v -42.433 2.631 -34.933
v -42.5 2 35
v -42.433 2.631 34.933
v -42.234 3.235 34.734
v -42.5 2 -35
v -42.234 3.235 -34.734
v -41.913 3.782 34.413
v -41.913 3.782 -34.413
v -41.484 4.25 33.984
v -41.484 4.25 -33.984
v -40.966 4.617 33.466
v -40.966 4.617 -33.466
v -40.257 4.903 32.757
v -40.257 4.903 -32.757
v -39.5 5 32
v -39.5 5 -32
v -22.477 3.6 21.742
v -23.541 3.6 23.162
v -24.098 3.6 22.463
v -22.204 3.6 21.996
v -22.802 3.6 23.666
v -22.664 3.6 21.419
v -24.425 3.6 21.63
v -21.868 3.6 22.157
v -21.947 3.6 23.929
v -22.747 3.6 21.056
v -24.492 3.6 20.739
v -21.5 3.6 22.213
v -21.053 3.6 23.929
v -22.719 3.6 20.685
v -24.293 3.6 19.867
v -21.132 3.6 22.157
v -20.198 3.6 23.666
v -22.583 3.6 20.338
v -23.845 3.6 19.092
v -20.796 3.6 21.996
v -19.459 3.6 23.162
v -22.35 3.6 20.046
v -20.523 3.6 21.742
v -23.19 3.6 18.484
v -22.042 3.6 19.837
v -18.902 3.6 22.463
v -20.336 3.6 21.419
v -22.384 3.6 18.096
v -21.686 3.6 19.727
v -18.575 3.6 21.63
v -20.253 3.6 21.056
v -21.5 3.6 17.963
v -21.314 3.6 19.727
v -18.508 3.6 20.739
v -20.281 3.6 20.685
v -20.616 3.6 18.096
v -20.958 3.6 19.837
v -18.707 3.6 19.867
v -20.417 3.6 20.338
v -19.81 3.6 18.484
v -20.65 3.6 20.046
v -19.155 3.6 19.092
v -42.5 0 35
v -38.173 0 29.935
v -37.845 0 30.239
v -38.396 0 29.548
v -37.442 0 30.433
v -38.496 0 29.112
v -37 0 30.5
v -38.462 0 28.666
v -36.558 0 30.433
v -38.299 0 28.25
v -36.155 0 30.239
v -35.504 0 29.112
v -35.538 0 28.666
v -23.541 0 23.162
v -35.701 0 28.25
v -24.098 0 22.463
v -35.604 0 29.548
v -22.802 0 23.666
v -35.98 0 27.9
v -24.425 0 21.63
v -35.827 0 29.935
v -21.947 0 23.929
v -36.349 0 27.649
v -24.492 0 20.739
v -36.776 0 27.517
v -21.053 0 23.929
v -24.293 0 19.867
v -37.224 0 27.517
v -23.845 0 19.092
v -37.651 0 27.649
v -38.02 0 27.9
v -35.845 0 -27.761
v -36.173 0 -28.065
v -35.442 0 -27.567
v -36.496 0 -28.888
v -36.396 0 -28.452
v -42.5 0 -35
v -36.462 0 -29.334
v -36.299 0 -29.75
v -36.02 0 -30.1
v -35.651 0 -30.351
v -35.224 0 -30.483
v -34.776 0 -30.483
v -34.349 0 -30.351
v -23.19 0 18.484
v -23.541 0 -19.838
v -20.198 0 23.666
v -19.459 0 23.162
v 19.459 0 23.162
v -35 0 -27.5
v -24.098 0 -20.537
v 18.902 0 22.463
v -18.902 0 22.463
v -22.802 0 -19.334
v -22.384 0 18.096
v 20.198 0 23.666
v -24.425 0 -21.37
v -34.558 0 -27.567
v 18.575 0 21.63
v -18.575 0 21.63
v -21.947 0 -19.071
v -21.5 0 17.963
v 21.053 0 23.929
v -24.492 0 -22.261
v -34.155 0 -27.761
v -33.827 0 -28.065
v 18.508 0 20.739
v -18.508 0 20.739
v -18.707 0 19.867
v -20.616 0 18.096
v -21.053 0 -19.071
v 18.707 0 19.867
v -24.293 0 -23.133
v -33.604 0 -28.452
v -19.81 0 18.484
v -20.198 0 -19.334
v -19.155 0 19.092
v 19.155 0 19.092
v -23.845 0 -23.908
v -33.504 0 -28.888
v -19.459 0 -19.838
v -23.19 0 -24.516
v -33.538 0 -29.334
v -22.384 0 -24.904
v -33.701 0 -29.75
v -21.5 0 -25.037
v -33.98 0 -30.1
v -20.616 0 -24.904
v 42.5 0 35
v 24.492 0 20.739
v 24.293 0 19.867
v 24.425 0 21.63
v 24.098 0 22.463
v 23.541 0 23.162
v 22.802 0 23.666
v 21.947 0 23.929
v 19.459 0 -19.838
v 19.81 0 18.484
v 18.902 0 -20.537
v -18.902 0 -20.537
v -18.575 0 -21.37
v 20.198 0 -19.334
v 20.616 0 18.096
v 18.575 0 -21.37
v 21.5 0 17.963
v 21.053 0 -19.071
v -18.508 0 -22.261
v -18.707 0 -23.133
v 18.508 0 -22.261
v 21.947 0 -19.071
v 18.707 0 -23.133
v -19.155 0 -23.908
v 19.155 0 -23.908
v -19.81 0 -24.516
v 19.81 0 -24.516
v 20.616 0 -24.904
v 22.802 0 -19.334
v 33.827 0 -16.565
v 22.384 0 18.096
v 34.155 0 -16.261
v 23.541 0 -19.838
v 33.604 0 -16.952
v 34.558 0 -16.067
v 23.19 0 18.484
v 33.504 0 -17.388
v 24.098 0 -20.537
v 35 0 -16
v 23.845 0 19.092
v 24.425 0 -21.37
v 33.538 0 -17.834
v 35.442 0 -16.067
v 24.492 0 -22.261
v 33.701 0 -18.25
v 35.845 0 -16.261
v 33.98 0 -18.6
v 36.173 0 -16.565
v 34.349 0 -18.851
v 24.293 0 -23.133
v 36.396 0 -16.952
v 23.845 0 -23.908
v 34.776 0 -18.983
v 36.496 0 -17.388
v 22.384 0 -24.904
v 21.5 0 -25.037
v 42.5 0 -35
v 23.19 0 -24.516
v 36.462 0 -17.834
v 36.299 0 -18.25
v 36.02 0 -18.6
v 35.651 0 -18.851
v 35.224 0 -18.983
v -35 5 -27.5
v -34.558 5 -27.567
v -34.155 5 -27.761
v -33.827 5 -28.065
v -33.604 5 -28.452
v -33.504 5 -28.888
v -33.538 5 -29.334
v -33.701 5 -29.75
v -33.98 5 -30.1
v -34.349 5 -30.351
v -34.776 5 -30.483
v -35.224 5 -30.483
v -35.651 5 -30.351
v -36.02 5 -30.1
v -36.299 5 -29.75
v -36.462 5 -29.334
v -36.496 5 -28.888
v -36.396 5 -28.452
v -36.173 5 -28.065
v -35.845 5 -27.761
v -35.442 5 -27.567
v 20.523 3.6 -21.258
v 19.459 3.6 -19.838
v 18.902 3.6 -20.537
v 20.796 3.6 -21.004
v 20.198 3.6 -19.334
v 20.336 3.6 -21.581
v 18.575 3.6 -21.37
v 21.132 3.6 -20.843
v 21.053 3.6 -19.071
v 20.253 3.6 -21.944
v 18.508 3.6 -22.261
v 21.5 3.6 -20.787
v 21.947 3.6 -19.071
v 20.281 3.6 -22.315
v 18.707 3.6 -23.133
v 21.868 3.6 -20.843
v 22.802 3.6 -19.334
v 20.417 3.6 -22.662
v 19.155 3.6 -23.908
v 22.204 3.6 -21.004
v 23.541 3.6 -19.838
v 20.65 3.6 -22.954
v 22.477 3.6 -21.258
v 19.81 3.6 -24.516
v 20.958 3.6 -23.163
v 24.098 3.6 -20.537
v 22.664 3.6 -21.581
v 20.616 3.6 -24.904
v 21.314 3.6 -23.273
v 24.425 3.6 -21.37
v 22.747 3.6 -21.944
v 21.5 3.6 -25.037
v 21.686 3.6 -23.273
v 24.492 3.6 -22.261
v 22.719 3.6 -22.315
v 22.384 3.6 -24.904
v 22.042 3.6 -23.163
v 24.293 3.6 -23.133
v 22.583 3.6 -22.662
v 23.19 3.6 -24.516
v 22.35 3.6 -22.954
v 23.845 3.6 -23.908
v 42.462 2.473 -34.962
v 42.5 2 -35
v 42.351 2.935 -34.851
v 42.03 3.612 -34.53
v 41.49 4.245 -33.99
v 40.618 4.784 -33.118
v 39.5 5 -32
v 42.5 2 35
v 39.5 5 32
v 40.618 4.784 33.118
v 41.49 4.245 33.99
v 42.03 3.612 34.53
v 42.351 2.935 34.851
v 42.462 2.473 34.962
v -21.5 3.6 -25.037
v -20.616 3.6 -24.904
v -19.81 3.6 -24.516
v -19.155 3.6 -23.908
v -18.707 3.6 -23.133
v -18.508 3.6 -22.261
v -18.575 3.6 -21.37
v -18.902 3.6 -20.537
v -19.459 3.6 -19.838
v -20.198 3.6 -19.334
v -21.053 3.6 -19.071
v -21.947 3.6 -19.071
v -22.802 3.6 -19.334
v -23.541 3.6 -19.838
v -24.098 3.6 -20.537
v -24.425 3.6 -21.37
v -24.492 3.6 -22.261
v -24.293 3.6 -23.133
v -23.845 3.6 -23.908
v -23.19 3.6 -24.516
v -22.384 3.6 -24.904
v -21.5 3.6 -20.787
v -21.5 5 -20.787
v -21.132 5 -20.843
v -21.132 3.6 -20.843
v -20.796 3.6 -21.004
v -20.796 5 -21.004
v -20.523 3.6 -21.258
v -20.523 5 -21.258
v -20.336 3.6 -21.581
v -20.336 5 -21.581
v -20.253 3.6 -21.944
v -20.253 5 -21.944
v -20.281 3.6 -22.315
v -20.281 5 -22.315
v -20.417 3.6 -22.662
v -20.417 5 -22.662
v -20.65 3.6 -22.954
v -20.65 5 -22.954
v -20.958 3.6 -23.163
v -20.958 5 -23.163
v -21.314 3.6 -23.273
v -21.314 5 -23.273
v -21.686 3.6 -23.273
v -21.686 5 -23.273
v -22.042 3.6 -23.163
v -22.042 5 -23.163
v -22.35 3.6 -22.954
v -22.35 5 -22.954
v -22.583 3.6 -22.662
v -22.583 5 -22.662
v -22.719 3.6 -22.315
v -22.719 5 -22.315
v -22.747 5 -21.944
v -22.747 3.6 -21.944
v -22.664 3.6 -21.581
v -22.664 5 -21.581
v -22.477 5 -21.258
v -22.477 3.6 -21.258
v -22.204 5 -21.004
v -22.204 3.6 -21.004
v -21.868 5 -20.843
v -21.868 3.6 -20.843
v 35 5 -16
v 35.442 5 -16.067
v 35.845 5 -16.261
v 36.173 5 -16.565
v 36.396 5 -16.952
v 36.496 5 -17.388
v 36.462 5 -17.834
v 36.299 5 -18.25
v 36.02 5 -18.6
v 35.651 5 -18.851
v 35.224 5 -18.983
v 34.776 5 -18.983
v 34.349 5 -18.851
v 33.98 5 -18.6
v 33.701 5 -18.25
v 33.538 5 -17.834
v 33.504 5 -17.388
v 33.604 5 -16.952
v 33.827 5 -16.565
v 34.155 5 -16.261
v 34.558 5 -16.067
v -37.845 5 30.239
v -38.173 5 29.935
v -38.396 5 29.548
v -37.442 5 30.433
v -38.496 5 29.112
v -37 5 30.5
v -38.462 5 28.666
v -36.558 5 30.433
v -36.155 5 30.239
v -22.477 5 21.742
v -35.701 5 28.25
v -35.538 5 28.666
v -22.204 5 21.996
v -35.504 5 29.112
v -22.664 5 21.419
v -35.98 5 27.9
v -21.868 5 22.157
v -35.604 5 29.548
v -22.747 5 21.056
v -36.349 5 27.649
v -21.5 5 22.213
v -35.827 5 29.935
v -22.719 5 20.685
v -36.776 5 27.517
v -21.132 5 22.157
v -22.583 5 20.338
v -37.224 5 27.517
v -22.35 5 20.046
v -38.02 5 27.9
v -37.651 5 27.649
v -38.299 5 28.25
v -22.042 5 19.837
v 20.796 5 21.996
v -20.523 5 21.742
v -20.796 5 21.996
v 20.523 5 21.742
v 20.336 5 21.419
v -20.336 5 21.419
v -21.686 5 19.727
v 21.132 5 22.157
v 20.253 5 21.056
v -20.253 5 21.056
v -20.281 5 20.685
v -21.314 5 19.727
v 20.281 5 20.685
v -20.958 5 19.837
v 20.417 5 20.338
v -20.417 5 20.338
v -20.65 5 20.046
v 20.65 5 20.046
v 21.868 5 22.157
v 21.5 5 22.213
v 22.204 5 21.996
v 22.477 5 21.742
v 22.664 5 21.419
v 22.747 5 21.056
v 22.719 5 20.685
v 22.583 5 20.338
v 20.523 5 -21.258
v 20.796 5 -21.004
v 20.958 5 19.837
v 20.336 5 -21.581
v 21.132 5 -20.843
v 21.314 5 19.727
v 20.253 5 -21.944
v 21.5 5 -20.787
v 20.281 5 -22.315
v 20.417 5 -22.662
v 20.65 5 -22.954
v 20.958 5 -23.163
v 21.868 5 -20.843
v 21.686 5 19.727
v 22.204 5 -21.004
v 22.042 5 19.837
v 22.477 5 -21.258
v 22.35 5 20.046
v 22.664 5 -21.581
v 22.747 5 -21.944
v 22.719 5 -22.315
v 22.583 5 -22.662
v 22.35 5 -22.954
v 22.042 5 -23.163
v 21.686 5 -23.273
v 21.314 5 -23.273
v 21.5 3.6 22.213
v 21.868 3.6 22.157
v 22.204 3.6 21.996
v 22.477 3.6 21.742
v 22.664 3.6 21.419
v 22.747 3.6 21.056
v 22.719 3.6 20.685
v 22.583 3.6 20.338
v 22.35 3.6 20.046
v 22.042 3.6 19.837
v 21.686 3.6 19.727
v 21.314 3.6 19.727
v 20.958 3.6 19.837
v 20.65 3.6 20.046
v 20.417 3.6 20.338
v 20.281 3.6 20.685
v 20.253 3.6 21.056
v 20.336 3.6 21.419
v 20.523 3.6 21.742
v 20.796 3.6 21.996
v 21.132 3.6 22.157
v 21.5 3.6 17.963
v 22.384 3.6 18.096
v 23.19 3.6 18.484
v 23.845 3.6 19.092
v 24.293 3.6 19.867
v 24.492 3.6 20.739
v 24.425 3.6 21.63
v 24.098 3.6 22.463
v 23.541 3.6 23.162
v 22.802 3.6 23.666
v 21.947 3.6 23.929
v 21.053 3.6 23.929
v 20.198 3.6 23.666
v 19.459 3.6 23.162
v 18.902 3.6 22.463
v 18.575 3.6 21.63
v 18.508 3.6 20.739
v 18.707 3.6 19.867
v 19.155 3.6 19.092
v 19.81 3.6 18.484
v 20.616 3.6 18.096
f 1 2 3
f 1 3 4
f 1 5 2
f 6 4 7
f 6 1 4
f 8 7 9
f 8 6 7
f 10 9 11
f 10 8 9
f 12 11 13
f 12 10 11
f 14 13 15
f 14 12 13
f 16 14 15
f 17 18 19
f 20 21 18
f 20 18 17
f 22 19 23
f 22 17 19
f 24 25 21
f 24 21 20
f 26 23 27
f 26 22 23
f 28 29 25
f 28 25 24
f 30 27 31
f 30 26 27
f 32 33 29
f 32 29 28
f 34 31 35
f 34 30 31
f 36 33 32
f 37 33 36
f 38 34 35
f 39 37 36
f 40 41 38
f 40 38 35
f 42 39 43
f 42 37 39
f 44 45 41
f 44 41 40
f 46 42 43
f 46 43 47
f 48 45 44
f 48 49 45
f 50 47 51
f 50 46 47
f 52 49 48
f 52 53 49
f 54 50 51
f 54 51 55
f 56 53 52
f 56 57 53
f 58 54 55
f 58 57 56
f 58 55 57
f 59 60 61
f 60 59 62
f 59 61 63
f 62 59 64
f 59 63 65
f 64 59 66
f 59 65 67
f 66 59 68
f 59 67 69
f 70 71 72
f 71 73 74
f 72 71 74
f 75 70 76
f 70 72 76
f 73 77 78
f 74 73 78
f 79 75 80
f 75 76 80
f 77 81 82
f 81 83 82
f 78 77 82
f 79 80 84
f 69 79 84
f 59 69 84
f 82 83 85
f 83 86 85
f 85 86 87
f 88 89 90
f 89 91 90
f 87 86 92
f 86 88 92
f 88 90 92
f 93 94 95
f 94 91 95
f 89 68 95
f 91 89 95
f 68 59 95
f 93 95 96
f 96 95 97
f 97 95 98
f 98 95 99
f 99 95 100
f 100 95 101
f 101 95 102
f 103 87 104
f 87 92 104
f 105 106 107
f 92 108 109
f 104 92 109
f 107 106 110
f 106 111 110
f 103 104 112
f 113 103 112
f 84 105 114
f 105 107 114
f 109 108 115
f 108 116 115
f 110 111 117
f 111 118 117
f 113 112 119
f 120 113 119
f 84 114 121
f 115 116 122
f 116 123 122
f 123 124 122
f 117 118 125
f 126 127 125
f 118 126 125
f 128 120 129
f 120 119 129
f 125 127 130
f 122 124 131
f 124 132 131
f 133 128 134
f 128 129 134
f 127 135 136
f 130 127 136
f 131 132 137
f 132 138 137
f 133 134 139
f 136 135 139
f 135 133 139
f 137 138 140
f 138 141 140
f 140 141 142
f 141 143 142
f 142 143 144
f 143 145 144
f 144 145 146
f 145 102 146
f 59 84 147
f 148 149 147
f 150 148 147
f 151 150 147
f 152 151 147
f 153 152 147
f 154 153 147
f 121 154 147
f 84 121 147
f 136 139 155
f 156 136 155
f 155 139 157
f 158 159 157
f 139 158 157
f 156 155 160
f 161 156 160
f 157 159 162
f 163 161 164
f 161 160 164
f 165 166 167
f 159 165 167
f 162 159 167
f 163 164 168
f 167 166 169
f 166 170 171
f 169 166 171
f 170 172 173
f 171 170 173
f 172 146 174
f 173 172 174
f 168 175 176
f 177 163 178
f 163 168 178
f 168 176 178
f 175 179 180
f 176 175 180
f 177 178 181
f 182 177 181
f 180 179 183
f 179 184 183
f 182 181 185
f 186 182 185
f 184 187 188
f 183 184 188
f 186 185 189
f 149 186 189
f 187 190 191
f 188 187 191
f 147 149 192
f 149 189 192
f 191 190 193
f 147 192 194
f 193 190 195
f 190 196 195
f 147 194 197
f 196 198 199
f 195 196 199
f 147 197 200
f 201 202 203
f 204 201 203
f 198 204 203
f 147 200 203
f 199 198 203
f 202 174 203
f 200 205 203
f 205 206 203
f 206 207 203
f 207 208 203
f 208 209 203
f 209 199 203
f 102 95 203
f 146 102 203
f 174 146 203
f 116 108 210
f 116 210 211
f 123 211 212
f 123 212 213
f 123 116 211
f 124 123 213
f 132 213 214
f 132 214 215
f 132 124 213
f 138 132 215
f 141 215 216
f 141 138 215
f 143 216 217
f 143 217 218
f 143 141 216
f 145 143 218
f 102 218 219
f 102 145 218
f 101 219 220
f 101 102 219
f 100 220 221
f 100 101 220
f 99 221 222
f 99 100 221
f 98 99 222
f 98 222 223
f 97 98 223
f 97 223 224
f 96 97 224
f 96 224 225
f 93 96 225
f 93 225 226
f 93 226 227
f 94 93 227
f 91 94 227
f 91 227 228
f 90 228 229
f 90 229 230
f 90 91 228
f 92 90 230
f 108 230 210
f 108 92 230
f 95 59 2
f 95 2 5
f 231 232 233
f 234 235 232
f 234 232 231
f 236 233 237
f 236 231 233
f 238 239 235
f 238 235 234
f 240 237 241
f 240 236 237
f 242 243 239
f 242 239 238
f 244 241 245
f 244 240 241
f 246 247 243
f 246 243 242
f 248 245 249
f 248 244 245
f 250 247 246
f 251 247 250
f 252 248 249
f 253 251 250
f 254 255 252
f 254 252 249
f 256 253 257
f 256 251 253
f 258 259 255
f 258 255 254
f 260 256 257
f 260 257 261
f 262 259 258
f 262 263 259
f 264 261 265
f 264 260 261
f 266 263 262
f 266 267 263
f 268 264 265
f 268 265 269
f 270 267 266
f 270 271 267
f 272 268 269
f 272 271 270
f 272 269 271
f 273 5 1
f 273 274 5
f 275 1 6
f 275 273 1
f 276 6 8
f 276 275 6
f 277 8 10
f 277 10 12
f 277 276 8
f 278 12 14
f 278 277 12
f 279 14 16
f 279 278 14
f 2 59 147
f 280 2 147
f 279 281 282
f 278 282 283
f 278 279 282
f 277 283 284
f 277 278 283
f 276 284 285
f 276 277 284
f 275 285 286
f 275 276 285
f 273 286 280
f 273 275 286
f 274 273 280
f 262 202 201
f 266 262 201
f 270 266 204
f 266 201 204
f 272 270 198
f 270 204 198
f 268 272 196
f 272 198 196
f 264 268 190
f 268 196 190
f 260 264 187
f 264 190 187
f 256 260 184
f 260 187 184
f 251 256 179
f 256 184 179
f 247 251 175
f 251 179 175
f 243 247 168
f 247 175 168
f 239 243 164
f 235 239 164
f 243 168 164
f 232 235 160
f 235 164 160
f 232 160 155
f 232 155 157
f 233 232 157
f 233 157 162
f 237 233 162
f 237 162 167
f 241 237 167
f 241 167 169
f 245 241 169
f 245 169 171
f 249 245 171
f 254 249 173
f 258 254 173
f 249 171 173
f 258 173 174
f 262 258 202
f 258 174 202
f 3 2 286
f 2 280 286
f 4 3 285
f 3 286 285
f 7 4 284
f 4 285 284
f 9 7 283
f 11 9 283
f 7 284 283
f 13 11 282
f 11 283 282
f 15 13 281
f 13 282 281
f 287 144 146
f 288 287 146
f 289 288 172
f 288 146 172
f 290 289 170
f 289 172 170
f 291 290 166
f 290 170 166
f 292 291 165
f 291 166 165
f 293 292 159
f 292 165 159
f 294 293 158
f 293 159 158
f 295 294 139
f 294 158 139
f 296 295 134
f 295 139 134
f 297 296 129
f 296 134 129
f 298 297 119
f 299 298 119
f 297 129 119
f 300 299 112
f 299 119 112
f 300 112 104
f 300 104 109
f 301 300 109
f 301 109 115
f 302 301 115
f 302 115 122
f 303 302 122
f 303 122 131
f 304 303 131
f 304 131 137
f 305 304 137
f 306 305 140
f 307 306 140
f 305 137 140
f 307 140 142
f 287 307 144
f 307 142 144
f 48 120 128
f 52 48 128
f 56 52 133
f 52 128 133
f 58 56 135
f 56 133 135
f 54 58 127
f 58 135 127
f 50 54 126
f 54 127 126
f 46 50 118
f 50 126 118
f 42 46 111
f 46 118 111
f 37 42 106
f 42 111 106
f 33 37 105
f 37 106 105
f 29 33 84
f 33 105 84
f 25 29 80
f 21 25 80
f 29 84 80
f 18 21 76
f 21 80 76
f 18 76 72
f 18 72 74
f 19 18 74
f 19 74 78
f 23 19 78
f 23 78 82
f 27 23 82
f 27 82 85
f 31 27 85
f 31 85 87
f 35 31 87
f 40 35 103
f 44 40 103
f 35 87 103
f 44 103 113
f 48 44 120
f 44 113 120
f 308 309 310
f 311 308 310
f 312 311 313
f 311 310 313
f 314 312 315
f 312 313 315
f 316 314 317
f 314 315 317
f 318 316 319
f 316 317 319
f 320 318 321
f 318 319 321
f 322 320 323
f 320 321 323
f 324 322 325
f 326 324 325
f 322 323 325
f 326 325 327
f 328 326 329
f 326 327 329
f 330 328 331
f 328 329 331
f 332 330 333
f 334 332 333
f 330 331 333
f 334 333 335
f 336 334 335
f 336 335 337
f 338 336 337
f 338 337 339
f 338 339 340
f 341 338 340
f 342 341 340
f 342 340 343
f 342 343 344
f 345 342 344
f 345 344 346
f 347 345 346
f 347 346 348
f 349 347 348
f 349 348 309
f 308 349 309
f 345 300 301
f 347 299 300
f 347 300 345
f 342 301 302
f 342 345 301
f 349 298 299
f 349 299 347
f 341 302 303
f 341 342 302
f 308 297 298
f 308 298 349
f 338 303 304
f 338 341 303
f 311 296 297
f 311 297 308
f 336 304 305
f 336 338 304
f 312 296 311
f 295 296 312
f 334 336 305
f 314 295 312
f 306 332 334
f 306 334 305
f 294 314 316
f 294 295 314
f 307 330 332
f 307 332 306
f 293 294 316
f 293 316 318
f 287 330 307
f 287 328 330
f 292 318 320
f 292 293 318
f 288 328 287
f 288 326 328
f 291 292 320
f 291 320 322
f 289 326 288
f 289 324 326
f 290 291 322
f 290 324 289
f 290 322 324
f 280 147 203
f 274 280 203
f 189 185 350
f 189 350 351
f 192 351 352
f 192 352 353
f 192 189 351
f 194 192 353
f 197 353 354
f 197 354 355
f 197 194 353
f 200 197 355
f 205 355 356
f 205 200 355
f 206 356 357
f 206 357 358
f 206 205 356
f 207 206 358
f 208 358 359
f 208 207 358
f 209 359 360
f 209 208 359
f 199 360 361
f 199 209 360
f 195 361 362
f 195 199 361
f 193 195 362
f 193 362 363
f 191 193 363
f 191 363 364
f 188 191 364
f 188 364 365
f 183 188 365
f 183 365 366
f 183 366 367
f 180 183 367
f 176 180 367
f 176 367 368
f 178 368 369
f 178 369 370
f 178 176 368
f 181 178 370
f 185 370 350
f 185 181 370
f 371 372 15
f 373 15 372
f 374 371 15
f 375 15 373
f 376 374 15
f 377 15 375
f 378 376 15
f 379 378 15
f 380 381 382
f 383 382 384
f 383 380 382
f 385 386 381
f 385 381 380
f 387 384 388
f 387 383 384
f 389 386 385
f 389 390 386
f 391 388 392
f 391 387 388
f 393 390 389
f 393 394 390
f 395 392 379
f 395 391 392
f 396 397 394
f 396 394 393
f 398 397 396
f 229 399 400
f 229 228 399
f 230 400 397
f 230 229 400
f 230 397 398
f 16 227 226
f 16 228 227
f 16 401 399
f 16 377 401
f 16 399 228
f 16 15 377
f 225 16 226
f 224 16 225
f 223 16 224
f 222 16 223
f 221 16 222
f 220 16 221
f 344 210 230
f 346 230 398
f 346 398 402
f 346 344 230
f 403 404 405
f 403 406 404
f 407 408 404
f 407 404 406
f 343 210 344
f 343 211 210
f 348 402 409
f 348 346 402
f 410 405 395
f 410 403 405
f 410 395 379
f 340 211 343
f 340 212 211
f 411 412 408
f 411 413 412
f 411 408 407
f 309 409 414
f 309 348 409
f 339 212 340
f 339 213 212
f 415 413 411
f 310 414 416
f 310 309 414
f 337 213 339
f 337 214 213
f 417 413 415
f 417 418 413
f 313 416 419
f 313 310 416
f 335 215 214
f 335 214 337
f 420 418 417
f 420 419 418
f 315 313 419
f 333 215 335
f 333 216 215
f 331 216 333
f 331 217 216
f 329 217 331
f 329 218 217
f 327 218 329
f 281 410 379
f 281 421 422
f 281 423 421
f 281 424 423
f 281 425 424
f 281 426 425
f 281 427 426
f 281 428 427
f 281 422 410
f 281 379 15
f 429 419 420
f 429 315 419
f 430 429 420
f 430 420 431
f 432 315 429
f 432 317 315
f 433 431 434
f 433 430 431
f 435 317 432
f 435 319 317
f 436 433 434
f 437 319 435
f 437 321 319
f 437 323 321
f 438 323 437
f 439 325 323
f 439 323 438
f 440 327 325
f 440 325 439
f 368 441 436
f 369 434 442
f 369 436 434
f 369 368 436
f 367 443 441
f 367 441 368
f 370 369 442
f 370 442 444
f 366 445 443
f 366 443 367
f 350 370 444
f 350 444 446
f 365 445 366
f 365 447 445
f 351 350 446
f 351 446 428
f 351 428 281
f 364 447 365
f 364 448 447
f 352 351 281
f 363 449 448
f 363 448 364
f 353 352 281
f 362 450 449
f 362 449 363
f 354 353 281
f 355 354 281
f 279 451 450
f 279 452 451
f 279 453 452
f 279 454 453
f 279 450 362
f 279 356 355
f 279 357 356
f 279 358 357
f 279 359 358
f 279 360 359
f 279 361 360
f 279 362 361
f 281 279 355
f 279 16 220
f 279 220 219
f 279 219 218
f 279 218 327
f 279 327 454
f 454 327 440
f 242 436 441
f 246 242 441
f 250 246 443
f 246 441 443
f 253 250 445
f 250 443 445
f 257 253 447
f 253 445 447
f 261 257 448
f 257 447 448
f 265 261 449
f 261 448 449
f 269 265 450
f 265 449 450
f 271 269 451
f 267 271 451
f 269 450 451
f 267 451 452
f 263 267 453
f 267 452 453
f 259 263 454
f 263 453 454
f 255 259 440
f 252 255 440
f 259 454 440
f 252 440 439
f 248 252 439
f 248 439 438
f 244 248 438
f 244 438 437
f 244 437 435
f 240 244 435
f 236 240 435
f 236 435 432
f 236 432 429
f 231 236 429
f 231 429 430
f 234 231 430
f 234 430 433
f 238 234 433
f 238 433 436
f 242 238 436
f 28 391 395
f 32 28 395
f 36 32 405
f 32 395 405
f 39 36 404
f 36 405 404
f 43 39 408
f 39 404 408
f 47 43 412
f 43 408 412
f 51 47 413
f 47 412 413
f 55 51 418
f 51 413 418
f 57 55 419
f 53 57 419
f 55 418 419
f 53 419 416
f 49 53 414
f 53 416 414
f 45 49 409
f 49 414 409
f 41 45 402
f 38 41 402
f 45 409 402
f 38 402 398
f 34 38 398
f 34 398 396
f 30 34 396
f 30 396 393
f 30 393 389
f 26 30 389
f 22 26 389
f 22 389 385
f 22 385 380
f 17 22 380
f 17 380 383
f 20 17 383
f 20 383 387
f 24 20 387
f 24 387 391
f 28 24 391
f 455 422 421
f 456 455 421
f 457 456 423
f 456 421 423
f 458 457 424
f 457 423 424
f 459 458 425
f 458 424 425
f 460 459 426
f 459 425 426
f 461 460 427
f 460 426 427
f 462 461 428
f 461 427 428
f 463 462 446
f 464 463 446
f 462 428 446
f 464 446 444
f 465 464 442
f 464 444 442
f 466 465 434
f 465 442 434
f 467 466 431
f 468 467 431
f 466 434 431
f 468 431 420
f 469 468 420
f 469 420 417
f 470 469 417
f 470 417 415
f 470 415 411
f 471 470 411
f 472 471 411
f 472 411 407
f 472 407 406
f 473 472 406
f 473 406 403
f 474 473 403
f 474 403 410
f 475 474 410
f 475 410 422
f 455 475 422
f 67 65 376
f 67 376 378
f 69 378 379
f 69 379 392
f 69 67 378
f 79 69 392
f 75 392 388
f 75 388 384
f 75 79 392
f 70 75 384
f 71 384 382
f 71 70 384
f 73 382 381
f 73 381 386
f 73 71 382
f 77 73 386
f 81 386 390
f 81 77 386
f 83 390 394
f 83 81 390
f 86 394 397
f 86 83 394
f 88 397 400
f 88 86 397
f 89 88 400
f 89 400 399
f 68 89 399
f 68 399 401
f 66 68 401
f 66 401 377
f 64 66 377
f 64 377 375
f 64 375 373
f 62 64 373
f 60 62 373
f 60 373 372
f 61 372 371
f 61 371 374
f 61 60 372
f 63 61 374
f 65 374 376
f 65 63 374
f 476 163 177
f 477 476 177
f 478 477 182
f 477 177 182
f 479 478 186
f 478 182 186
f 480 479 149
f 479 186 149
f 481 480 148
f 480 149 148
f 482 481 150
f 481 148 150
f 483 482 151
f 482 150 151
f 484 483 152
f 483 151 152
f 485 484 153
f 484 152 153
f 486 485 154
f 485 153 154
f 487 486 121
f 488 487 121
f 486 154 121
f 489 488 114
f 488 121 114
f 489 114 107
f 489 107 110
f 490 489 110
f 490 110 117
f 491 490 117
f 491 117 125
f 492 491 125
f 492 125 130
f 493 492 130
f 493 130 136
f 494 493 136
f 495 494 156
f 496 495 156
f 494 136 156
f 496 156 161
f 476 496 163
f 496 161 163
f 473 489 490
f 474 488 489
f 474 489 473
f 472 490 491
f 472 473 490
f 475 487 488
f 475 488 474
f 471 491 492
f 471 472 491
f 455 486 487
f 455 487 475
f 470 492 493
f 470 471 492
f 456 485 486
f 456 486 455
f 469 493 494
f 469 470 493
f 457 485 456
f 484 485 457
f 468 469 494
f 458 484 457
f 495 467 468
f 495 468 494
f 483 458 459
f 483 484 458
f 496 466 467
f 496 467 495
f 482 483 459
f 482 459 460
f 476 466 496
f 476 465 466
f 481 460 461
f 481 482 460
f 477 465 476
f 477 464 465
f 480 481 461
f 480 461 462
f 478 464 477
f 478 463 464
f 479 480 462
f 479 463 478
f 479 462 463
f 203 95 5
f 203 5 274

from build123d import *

# Parameters (mm, degrees)
SKETCH1_W           = 85
SKETCH1_H           = 70
SKETCH1_R           = 1.5
BOSS_EXTRUDE1_DEPTH = 5
CUT_EXTRUDE1_REACH  = 57.283
SKETCH3_R           = 1.25
SKETCH4_R           = 3
CUT_EXTRUDE2_DEPTH  = 3.6
FILLET2_R           = 3


with BuildPart() as part:
    # Sketch1 → Boss-Extrude1 (new body)
    with BuildSketch(Plane(origin=(0, 0, 0), x_dir=(1, 0, 0), z_dir=(0, 1, 0))):
        Rectangle(SKETCH1_W, SKETCH1_H)
        with Locations(Location((-35, 29, 0), (0, 0, 270))):
            Circle(SKETCH1_R, mode=Mode.SUBTRACT)
        with Locations(Location((-37, -29, 0), (0, 0, 270))):
            Circle(SKETCH1_R, mode=Mode.SUBTRACT)
        with Locations(Location((35, 17.5, 0), (0, 0, 270))):
            Circle(SKETCH1_R, mode=Mode.SUBTRACT)
    extrude(amount=BOSS_EXTRUDE1_DEPTH)

    # Sketch3 → Cut-Extrude1 (cut, up to next)
    with BuildSketch(Plane(origin=(0, 5, 0), x_dir=(1, 0, 0), z_dir=(0, 1, 0)), mode=Mode.PRIVATE) as cut_extrude1_sk1:
        with Locations(Location((-21.5, 22.037196785, 0), (0, 0, 270))):
            Circle(SKETCH3_R)
    cut_extrude1_tool1 = extrude(cut_extrude1_sk1.sketch, amount=-CUT_EXTRUDE1_REACH, mode=Mode.PRIVATE) & part.part
    # Sketch3 → Cut-Extrude1 (cut, up to next)
    with BuildSketch(Plane(origin=(0, 5, 0), x_dir=(1, 0, 0), z_dir=(0, 1, 0)), mode=Mode.PRIVATE) as cut_extrude1_sk2:
        with Locations(Location((21.5, 22.037196785, 0), (0, 0, 270))):
            Circle(SKETCH3_R)
    cut_extrude1_tool2 = extrude(cut_extrude1_sk2.sketch, amount=-CUT_EXTRUDE1_REACH, mode=Mode.PRIVATE) & part.part
    # Sketch3 → Cut-Extrude1 (cut, up to next)
    with BuildSketch(Plane(origin=(0, 5, 0), x_dir=(1, 0, 0), z_dir=(0, 1, 0)), mode=Mode.PRIVATE) as cut_extrude1_sk3:
        with Locations(Location((-21.5, -20.962803215, 0), (0, 0, 270))):
            Circle(SKETCH3_R)
    cut_extrude1_tool3 = extrude(cut_extrude1_sk3.sketch, amount=-CUT_EXTRUDE1_REACH, mode=Mode.PRIVATE) & part.part
    # Sketch3 → Cut-Extrude1 (cut, up to next)
    with BuildSketch(Plane(origin=(0, 5, 0), x_dir=(1, 0, 0), z_dir=(0, 1, 0)), mode=Mode.PRIVATE) as cut_extrude1_sk4:
        with Locations(Location((21.5, -20.962803215, 0), (0, 0, 270))):
            Circle(SKETCH3_R)
    cut_extrude1_tool4 = extrude(cut_extrude1_sk4.sketch, amount=-CUT_EXTRUDE1_REACH, mode=Mode.PRIVATE) & part.part
    add(cut_extrude1_tool1.solids().sort_by_distance((-21.5, 5, -22.037197))[0], mode=Mode.SUBTRACT)
    add(cut_extrude1_tool2.solids().sort_by_distance((21.5, 5, -22.037197))[0], mode=Mode.SUBTRACT)
    add(cut_extrude1_tool3.solids().sort_by_distance((-21.5, 5, 20.962803))[0], mode=Mode.SUBTRACT)
    add(cut_extrude1_tool4.solids().sort_by_distance((21.5, 5, 20.962803))[0], mode=Mode.SUBTRACT)

    # Sketch4 → Cut-Extrude2 (cut)
    with BuildSketch(Plane.XZ):
        with Locations(Location((-21.5, 20.962803215, 0), (0, 0, 270))):
            Circle(SKETCH4_R)
        with Locations(Location((21.5, 20.962803215, 0), (0, 0, 270))):
            Circle(SKETCH4_R)
        with Locations(Location((21.5, -22.037196785, 0), (0, 0, 270))):
            Circle(SKETCH4_R)
        with Locations(Location((-21.5, -22.037196785, 0), (0, 0, 270))):
            Circle(SKETCH4_R)
    extrude(amount=-CUT_EXTRUDE2_DEPTH, mode=Mode.SUBTRACT)

    # Fillet2
    fillet2_edges = [part.edges().sort_by_distance(p)[0] for p in [
        (42.5, 5, 0),
        (0, 5, -35),
        (-42.5, 5, 0),
        (0, 5, 35),
    ]]
    fillet(fillet2_edges, radius=FILLET2_R)


solid = part.part
